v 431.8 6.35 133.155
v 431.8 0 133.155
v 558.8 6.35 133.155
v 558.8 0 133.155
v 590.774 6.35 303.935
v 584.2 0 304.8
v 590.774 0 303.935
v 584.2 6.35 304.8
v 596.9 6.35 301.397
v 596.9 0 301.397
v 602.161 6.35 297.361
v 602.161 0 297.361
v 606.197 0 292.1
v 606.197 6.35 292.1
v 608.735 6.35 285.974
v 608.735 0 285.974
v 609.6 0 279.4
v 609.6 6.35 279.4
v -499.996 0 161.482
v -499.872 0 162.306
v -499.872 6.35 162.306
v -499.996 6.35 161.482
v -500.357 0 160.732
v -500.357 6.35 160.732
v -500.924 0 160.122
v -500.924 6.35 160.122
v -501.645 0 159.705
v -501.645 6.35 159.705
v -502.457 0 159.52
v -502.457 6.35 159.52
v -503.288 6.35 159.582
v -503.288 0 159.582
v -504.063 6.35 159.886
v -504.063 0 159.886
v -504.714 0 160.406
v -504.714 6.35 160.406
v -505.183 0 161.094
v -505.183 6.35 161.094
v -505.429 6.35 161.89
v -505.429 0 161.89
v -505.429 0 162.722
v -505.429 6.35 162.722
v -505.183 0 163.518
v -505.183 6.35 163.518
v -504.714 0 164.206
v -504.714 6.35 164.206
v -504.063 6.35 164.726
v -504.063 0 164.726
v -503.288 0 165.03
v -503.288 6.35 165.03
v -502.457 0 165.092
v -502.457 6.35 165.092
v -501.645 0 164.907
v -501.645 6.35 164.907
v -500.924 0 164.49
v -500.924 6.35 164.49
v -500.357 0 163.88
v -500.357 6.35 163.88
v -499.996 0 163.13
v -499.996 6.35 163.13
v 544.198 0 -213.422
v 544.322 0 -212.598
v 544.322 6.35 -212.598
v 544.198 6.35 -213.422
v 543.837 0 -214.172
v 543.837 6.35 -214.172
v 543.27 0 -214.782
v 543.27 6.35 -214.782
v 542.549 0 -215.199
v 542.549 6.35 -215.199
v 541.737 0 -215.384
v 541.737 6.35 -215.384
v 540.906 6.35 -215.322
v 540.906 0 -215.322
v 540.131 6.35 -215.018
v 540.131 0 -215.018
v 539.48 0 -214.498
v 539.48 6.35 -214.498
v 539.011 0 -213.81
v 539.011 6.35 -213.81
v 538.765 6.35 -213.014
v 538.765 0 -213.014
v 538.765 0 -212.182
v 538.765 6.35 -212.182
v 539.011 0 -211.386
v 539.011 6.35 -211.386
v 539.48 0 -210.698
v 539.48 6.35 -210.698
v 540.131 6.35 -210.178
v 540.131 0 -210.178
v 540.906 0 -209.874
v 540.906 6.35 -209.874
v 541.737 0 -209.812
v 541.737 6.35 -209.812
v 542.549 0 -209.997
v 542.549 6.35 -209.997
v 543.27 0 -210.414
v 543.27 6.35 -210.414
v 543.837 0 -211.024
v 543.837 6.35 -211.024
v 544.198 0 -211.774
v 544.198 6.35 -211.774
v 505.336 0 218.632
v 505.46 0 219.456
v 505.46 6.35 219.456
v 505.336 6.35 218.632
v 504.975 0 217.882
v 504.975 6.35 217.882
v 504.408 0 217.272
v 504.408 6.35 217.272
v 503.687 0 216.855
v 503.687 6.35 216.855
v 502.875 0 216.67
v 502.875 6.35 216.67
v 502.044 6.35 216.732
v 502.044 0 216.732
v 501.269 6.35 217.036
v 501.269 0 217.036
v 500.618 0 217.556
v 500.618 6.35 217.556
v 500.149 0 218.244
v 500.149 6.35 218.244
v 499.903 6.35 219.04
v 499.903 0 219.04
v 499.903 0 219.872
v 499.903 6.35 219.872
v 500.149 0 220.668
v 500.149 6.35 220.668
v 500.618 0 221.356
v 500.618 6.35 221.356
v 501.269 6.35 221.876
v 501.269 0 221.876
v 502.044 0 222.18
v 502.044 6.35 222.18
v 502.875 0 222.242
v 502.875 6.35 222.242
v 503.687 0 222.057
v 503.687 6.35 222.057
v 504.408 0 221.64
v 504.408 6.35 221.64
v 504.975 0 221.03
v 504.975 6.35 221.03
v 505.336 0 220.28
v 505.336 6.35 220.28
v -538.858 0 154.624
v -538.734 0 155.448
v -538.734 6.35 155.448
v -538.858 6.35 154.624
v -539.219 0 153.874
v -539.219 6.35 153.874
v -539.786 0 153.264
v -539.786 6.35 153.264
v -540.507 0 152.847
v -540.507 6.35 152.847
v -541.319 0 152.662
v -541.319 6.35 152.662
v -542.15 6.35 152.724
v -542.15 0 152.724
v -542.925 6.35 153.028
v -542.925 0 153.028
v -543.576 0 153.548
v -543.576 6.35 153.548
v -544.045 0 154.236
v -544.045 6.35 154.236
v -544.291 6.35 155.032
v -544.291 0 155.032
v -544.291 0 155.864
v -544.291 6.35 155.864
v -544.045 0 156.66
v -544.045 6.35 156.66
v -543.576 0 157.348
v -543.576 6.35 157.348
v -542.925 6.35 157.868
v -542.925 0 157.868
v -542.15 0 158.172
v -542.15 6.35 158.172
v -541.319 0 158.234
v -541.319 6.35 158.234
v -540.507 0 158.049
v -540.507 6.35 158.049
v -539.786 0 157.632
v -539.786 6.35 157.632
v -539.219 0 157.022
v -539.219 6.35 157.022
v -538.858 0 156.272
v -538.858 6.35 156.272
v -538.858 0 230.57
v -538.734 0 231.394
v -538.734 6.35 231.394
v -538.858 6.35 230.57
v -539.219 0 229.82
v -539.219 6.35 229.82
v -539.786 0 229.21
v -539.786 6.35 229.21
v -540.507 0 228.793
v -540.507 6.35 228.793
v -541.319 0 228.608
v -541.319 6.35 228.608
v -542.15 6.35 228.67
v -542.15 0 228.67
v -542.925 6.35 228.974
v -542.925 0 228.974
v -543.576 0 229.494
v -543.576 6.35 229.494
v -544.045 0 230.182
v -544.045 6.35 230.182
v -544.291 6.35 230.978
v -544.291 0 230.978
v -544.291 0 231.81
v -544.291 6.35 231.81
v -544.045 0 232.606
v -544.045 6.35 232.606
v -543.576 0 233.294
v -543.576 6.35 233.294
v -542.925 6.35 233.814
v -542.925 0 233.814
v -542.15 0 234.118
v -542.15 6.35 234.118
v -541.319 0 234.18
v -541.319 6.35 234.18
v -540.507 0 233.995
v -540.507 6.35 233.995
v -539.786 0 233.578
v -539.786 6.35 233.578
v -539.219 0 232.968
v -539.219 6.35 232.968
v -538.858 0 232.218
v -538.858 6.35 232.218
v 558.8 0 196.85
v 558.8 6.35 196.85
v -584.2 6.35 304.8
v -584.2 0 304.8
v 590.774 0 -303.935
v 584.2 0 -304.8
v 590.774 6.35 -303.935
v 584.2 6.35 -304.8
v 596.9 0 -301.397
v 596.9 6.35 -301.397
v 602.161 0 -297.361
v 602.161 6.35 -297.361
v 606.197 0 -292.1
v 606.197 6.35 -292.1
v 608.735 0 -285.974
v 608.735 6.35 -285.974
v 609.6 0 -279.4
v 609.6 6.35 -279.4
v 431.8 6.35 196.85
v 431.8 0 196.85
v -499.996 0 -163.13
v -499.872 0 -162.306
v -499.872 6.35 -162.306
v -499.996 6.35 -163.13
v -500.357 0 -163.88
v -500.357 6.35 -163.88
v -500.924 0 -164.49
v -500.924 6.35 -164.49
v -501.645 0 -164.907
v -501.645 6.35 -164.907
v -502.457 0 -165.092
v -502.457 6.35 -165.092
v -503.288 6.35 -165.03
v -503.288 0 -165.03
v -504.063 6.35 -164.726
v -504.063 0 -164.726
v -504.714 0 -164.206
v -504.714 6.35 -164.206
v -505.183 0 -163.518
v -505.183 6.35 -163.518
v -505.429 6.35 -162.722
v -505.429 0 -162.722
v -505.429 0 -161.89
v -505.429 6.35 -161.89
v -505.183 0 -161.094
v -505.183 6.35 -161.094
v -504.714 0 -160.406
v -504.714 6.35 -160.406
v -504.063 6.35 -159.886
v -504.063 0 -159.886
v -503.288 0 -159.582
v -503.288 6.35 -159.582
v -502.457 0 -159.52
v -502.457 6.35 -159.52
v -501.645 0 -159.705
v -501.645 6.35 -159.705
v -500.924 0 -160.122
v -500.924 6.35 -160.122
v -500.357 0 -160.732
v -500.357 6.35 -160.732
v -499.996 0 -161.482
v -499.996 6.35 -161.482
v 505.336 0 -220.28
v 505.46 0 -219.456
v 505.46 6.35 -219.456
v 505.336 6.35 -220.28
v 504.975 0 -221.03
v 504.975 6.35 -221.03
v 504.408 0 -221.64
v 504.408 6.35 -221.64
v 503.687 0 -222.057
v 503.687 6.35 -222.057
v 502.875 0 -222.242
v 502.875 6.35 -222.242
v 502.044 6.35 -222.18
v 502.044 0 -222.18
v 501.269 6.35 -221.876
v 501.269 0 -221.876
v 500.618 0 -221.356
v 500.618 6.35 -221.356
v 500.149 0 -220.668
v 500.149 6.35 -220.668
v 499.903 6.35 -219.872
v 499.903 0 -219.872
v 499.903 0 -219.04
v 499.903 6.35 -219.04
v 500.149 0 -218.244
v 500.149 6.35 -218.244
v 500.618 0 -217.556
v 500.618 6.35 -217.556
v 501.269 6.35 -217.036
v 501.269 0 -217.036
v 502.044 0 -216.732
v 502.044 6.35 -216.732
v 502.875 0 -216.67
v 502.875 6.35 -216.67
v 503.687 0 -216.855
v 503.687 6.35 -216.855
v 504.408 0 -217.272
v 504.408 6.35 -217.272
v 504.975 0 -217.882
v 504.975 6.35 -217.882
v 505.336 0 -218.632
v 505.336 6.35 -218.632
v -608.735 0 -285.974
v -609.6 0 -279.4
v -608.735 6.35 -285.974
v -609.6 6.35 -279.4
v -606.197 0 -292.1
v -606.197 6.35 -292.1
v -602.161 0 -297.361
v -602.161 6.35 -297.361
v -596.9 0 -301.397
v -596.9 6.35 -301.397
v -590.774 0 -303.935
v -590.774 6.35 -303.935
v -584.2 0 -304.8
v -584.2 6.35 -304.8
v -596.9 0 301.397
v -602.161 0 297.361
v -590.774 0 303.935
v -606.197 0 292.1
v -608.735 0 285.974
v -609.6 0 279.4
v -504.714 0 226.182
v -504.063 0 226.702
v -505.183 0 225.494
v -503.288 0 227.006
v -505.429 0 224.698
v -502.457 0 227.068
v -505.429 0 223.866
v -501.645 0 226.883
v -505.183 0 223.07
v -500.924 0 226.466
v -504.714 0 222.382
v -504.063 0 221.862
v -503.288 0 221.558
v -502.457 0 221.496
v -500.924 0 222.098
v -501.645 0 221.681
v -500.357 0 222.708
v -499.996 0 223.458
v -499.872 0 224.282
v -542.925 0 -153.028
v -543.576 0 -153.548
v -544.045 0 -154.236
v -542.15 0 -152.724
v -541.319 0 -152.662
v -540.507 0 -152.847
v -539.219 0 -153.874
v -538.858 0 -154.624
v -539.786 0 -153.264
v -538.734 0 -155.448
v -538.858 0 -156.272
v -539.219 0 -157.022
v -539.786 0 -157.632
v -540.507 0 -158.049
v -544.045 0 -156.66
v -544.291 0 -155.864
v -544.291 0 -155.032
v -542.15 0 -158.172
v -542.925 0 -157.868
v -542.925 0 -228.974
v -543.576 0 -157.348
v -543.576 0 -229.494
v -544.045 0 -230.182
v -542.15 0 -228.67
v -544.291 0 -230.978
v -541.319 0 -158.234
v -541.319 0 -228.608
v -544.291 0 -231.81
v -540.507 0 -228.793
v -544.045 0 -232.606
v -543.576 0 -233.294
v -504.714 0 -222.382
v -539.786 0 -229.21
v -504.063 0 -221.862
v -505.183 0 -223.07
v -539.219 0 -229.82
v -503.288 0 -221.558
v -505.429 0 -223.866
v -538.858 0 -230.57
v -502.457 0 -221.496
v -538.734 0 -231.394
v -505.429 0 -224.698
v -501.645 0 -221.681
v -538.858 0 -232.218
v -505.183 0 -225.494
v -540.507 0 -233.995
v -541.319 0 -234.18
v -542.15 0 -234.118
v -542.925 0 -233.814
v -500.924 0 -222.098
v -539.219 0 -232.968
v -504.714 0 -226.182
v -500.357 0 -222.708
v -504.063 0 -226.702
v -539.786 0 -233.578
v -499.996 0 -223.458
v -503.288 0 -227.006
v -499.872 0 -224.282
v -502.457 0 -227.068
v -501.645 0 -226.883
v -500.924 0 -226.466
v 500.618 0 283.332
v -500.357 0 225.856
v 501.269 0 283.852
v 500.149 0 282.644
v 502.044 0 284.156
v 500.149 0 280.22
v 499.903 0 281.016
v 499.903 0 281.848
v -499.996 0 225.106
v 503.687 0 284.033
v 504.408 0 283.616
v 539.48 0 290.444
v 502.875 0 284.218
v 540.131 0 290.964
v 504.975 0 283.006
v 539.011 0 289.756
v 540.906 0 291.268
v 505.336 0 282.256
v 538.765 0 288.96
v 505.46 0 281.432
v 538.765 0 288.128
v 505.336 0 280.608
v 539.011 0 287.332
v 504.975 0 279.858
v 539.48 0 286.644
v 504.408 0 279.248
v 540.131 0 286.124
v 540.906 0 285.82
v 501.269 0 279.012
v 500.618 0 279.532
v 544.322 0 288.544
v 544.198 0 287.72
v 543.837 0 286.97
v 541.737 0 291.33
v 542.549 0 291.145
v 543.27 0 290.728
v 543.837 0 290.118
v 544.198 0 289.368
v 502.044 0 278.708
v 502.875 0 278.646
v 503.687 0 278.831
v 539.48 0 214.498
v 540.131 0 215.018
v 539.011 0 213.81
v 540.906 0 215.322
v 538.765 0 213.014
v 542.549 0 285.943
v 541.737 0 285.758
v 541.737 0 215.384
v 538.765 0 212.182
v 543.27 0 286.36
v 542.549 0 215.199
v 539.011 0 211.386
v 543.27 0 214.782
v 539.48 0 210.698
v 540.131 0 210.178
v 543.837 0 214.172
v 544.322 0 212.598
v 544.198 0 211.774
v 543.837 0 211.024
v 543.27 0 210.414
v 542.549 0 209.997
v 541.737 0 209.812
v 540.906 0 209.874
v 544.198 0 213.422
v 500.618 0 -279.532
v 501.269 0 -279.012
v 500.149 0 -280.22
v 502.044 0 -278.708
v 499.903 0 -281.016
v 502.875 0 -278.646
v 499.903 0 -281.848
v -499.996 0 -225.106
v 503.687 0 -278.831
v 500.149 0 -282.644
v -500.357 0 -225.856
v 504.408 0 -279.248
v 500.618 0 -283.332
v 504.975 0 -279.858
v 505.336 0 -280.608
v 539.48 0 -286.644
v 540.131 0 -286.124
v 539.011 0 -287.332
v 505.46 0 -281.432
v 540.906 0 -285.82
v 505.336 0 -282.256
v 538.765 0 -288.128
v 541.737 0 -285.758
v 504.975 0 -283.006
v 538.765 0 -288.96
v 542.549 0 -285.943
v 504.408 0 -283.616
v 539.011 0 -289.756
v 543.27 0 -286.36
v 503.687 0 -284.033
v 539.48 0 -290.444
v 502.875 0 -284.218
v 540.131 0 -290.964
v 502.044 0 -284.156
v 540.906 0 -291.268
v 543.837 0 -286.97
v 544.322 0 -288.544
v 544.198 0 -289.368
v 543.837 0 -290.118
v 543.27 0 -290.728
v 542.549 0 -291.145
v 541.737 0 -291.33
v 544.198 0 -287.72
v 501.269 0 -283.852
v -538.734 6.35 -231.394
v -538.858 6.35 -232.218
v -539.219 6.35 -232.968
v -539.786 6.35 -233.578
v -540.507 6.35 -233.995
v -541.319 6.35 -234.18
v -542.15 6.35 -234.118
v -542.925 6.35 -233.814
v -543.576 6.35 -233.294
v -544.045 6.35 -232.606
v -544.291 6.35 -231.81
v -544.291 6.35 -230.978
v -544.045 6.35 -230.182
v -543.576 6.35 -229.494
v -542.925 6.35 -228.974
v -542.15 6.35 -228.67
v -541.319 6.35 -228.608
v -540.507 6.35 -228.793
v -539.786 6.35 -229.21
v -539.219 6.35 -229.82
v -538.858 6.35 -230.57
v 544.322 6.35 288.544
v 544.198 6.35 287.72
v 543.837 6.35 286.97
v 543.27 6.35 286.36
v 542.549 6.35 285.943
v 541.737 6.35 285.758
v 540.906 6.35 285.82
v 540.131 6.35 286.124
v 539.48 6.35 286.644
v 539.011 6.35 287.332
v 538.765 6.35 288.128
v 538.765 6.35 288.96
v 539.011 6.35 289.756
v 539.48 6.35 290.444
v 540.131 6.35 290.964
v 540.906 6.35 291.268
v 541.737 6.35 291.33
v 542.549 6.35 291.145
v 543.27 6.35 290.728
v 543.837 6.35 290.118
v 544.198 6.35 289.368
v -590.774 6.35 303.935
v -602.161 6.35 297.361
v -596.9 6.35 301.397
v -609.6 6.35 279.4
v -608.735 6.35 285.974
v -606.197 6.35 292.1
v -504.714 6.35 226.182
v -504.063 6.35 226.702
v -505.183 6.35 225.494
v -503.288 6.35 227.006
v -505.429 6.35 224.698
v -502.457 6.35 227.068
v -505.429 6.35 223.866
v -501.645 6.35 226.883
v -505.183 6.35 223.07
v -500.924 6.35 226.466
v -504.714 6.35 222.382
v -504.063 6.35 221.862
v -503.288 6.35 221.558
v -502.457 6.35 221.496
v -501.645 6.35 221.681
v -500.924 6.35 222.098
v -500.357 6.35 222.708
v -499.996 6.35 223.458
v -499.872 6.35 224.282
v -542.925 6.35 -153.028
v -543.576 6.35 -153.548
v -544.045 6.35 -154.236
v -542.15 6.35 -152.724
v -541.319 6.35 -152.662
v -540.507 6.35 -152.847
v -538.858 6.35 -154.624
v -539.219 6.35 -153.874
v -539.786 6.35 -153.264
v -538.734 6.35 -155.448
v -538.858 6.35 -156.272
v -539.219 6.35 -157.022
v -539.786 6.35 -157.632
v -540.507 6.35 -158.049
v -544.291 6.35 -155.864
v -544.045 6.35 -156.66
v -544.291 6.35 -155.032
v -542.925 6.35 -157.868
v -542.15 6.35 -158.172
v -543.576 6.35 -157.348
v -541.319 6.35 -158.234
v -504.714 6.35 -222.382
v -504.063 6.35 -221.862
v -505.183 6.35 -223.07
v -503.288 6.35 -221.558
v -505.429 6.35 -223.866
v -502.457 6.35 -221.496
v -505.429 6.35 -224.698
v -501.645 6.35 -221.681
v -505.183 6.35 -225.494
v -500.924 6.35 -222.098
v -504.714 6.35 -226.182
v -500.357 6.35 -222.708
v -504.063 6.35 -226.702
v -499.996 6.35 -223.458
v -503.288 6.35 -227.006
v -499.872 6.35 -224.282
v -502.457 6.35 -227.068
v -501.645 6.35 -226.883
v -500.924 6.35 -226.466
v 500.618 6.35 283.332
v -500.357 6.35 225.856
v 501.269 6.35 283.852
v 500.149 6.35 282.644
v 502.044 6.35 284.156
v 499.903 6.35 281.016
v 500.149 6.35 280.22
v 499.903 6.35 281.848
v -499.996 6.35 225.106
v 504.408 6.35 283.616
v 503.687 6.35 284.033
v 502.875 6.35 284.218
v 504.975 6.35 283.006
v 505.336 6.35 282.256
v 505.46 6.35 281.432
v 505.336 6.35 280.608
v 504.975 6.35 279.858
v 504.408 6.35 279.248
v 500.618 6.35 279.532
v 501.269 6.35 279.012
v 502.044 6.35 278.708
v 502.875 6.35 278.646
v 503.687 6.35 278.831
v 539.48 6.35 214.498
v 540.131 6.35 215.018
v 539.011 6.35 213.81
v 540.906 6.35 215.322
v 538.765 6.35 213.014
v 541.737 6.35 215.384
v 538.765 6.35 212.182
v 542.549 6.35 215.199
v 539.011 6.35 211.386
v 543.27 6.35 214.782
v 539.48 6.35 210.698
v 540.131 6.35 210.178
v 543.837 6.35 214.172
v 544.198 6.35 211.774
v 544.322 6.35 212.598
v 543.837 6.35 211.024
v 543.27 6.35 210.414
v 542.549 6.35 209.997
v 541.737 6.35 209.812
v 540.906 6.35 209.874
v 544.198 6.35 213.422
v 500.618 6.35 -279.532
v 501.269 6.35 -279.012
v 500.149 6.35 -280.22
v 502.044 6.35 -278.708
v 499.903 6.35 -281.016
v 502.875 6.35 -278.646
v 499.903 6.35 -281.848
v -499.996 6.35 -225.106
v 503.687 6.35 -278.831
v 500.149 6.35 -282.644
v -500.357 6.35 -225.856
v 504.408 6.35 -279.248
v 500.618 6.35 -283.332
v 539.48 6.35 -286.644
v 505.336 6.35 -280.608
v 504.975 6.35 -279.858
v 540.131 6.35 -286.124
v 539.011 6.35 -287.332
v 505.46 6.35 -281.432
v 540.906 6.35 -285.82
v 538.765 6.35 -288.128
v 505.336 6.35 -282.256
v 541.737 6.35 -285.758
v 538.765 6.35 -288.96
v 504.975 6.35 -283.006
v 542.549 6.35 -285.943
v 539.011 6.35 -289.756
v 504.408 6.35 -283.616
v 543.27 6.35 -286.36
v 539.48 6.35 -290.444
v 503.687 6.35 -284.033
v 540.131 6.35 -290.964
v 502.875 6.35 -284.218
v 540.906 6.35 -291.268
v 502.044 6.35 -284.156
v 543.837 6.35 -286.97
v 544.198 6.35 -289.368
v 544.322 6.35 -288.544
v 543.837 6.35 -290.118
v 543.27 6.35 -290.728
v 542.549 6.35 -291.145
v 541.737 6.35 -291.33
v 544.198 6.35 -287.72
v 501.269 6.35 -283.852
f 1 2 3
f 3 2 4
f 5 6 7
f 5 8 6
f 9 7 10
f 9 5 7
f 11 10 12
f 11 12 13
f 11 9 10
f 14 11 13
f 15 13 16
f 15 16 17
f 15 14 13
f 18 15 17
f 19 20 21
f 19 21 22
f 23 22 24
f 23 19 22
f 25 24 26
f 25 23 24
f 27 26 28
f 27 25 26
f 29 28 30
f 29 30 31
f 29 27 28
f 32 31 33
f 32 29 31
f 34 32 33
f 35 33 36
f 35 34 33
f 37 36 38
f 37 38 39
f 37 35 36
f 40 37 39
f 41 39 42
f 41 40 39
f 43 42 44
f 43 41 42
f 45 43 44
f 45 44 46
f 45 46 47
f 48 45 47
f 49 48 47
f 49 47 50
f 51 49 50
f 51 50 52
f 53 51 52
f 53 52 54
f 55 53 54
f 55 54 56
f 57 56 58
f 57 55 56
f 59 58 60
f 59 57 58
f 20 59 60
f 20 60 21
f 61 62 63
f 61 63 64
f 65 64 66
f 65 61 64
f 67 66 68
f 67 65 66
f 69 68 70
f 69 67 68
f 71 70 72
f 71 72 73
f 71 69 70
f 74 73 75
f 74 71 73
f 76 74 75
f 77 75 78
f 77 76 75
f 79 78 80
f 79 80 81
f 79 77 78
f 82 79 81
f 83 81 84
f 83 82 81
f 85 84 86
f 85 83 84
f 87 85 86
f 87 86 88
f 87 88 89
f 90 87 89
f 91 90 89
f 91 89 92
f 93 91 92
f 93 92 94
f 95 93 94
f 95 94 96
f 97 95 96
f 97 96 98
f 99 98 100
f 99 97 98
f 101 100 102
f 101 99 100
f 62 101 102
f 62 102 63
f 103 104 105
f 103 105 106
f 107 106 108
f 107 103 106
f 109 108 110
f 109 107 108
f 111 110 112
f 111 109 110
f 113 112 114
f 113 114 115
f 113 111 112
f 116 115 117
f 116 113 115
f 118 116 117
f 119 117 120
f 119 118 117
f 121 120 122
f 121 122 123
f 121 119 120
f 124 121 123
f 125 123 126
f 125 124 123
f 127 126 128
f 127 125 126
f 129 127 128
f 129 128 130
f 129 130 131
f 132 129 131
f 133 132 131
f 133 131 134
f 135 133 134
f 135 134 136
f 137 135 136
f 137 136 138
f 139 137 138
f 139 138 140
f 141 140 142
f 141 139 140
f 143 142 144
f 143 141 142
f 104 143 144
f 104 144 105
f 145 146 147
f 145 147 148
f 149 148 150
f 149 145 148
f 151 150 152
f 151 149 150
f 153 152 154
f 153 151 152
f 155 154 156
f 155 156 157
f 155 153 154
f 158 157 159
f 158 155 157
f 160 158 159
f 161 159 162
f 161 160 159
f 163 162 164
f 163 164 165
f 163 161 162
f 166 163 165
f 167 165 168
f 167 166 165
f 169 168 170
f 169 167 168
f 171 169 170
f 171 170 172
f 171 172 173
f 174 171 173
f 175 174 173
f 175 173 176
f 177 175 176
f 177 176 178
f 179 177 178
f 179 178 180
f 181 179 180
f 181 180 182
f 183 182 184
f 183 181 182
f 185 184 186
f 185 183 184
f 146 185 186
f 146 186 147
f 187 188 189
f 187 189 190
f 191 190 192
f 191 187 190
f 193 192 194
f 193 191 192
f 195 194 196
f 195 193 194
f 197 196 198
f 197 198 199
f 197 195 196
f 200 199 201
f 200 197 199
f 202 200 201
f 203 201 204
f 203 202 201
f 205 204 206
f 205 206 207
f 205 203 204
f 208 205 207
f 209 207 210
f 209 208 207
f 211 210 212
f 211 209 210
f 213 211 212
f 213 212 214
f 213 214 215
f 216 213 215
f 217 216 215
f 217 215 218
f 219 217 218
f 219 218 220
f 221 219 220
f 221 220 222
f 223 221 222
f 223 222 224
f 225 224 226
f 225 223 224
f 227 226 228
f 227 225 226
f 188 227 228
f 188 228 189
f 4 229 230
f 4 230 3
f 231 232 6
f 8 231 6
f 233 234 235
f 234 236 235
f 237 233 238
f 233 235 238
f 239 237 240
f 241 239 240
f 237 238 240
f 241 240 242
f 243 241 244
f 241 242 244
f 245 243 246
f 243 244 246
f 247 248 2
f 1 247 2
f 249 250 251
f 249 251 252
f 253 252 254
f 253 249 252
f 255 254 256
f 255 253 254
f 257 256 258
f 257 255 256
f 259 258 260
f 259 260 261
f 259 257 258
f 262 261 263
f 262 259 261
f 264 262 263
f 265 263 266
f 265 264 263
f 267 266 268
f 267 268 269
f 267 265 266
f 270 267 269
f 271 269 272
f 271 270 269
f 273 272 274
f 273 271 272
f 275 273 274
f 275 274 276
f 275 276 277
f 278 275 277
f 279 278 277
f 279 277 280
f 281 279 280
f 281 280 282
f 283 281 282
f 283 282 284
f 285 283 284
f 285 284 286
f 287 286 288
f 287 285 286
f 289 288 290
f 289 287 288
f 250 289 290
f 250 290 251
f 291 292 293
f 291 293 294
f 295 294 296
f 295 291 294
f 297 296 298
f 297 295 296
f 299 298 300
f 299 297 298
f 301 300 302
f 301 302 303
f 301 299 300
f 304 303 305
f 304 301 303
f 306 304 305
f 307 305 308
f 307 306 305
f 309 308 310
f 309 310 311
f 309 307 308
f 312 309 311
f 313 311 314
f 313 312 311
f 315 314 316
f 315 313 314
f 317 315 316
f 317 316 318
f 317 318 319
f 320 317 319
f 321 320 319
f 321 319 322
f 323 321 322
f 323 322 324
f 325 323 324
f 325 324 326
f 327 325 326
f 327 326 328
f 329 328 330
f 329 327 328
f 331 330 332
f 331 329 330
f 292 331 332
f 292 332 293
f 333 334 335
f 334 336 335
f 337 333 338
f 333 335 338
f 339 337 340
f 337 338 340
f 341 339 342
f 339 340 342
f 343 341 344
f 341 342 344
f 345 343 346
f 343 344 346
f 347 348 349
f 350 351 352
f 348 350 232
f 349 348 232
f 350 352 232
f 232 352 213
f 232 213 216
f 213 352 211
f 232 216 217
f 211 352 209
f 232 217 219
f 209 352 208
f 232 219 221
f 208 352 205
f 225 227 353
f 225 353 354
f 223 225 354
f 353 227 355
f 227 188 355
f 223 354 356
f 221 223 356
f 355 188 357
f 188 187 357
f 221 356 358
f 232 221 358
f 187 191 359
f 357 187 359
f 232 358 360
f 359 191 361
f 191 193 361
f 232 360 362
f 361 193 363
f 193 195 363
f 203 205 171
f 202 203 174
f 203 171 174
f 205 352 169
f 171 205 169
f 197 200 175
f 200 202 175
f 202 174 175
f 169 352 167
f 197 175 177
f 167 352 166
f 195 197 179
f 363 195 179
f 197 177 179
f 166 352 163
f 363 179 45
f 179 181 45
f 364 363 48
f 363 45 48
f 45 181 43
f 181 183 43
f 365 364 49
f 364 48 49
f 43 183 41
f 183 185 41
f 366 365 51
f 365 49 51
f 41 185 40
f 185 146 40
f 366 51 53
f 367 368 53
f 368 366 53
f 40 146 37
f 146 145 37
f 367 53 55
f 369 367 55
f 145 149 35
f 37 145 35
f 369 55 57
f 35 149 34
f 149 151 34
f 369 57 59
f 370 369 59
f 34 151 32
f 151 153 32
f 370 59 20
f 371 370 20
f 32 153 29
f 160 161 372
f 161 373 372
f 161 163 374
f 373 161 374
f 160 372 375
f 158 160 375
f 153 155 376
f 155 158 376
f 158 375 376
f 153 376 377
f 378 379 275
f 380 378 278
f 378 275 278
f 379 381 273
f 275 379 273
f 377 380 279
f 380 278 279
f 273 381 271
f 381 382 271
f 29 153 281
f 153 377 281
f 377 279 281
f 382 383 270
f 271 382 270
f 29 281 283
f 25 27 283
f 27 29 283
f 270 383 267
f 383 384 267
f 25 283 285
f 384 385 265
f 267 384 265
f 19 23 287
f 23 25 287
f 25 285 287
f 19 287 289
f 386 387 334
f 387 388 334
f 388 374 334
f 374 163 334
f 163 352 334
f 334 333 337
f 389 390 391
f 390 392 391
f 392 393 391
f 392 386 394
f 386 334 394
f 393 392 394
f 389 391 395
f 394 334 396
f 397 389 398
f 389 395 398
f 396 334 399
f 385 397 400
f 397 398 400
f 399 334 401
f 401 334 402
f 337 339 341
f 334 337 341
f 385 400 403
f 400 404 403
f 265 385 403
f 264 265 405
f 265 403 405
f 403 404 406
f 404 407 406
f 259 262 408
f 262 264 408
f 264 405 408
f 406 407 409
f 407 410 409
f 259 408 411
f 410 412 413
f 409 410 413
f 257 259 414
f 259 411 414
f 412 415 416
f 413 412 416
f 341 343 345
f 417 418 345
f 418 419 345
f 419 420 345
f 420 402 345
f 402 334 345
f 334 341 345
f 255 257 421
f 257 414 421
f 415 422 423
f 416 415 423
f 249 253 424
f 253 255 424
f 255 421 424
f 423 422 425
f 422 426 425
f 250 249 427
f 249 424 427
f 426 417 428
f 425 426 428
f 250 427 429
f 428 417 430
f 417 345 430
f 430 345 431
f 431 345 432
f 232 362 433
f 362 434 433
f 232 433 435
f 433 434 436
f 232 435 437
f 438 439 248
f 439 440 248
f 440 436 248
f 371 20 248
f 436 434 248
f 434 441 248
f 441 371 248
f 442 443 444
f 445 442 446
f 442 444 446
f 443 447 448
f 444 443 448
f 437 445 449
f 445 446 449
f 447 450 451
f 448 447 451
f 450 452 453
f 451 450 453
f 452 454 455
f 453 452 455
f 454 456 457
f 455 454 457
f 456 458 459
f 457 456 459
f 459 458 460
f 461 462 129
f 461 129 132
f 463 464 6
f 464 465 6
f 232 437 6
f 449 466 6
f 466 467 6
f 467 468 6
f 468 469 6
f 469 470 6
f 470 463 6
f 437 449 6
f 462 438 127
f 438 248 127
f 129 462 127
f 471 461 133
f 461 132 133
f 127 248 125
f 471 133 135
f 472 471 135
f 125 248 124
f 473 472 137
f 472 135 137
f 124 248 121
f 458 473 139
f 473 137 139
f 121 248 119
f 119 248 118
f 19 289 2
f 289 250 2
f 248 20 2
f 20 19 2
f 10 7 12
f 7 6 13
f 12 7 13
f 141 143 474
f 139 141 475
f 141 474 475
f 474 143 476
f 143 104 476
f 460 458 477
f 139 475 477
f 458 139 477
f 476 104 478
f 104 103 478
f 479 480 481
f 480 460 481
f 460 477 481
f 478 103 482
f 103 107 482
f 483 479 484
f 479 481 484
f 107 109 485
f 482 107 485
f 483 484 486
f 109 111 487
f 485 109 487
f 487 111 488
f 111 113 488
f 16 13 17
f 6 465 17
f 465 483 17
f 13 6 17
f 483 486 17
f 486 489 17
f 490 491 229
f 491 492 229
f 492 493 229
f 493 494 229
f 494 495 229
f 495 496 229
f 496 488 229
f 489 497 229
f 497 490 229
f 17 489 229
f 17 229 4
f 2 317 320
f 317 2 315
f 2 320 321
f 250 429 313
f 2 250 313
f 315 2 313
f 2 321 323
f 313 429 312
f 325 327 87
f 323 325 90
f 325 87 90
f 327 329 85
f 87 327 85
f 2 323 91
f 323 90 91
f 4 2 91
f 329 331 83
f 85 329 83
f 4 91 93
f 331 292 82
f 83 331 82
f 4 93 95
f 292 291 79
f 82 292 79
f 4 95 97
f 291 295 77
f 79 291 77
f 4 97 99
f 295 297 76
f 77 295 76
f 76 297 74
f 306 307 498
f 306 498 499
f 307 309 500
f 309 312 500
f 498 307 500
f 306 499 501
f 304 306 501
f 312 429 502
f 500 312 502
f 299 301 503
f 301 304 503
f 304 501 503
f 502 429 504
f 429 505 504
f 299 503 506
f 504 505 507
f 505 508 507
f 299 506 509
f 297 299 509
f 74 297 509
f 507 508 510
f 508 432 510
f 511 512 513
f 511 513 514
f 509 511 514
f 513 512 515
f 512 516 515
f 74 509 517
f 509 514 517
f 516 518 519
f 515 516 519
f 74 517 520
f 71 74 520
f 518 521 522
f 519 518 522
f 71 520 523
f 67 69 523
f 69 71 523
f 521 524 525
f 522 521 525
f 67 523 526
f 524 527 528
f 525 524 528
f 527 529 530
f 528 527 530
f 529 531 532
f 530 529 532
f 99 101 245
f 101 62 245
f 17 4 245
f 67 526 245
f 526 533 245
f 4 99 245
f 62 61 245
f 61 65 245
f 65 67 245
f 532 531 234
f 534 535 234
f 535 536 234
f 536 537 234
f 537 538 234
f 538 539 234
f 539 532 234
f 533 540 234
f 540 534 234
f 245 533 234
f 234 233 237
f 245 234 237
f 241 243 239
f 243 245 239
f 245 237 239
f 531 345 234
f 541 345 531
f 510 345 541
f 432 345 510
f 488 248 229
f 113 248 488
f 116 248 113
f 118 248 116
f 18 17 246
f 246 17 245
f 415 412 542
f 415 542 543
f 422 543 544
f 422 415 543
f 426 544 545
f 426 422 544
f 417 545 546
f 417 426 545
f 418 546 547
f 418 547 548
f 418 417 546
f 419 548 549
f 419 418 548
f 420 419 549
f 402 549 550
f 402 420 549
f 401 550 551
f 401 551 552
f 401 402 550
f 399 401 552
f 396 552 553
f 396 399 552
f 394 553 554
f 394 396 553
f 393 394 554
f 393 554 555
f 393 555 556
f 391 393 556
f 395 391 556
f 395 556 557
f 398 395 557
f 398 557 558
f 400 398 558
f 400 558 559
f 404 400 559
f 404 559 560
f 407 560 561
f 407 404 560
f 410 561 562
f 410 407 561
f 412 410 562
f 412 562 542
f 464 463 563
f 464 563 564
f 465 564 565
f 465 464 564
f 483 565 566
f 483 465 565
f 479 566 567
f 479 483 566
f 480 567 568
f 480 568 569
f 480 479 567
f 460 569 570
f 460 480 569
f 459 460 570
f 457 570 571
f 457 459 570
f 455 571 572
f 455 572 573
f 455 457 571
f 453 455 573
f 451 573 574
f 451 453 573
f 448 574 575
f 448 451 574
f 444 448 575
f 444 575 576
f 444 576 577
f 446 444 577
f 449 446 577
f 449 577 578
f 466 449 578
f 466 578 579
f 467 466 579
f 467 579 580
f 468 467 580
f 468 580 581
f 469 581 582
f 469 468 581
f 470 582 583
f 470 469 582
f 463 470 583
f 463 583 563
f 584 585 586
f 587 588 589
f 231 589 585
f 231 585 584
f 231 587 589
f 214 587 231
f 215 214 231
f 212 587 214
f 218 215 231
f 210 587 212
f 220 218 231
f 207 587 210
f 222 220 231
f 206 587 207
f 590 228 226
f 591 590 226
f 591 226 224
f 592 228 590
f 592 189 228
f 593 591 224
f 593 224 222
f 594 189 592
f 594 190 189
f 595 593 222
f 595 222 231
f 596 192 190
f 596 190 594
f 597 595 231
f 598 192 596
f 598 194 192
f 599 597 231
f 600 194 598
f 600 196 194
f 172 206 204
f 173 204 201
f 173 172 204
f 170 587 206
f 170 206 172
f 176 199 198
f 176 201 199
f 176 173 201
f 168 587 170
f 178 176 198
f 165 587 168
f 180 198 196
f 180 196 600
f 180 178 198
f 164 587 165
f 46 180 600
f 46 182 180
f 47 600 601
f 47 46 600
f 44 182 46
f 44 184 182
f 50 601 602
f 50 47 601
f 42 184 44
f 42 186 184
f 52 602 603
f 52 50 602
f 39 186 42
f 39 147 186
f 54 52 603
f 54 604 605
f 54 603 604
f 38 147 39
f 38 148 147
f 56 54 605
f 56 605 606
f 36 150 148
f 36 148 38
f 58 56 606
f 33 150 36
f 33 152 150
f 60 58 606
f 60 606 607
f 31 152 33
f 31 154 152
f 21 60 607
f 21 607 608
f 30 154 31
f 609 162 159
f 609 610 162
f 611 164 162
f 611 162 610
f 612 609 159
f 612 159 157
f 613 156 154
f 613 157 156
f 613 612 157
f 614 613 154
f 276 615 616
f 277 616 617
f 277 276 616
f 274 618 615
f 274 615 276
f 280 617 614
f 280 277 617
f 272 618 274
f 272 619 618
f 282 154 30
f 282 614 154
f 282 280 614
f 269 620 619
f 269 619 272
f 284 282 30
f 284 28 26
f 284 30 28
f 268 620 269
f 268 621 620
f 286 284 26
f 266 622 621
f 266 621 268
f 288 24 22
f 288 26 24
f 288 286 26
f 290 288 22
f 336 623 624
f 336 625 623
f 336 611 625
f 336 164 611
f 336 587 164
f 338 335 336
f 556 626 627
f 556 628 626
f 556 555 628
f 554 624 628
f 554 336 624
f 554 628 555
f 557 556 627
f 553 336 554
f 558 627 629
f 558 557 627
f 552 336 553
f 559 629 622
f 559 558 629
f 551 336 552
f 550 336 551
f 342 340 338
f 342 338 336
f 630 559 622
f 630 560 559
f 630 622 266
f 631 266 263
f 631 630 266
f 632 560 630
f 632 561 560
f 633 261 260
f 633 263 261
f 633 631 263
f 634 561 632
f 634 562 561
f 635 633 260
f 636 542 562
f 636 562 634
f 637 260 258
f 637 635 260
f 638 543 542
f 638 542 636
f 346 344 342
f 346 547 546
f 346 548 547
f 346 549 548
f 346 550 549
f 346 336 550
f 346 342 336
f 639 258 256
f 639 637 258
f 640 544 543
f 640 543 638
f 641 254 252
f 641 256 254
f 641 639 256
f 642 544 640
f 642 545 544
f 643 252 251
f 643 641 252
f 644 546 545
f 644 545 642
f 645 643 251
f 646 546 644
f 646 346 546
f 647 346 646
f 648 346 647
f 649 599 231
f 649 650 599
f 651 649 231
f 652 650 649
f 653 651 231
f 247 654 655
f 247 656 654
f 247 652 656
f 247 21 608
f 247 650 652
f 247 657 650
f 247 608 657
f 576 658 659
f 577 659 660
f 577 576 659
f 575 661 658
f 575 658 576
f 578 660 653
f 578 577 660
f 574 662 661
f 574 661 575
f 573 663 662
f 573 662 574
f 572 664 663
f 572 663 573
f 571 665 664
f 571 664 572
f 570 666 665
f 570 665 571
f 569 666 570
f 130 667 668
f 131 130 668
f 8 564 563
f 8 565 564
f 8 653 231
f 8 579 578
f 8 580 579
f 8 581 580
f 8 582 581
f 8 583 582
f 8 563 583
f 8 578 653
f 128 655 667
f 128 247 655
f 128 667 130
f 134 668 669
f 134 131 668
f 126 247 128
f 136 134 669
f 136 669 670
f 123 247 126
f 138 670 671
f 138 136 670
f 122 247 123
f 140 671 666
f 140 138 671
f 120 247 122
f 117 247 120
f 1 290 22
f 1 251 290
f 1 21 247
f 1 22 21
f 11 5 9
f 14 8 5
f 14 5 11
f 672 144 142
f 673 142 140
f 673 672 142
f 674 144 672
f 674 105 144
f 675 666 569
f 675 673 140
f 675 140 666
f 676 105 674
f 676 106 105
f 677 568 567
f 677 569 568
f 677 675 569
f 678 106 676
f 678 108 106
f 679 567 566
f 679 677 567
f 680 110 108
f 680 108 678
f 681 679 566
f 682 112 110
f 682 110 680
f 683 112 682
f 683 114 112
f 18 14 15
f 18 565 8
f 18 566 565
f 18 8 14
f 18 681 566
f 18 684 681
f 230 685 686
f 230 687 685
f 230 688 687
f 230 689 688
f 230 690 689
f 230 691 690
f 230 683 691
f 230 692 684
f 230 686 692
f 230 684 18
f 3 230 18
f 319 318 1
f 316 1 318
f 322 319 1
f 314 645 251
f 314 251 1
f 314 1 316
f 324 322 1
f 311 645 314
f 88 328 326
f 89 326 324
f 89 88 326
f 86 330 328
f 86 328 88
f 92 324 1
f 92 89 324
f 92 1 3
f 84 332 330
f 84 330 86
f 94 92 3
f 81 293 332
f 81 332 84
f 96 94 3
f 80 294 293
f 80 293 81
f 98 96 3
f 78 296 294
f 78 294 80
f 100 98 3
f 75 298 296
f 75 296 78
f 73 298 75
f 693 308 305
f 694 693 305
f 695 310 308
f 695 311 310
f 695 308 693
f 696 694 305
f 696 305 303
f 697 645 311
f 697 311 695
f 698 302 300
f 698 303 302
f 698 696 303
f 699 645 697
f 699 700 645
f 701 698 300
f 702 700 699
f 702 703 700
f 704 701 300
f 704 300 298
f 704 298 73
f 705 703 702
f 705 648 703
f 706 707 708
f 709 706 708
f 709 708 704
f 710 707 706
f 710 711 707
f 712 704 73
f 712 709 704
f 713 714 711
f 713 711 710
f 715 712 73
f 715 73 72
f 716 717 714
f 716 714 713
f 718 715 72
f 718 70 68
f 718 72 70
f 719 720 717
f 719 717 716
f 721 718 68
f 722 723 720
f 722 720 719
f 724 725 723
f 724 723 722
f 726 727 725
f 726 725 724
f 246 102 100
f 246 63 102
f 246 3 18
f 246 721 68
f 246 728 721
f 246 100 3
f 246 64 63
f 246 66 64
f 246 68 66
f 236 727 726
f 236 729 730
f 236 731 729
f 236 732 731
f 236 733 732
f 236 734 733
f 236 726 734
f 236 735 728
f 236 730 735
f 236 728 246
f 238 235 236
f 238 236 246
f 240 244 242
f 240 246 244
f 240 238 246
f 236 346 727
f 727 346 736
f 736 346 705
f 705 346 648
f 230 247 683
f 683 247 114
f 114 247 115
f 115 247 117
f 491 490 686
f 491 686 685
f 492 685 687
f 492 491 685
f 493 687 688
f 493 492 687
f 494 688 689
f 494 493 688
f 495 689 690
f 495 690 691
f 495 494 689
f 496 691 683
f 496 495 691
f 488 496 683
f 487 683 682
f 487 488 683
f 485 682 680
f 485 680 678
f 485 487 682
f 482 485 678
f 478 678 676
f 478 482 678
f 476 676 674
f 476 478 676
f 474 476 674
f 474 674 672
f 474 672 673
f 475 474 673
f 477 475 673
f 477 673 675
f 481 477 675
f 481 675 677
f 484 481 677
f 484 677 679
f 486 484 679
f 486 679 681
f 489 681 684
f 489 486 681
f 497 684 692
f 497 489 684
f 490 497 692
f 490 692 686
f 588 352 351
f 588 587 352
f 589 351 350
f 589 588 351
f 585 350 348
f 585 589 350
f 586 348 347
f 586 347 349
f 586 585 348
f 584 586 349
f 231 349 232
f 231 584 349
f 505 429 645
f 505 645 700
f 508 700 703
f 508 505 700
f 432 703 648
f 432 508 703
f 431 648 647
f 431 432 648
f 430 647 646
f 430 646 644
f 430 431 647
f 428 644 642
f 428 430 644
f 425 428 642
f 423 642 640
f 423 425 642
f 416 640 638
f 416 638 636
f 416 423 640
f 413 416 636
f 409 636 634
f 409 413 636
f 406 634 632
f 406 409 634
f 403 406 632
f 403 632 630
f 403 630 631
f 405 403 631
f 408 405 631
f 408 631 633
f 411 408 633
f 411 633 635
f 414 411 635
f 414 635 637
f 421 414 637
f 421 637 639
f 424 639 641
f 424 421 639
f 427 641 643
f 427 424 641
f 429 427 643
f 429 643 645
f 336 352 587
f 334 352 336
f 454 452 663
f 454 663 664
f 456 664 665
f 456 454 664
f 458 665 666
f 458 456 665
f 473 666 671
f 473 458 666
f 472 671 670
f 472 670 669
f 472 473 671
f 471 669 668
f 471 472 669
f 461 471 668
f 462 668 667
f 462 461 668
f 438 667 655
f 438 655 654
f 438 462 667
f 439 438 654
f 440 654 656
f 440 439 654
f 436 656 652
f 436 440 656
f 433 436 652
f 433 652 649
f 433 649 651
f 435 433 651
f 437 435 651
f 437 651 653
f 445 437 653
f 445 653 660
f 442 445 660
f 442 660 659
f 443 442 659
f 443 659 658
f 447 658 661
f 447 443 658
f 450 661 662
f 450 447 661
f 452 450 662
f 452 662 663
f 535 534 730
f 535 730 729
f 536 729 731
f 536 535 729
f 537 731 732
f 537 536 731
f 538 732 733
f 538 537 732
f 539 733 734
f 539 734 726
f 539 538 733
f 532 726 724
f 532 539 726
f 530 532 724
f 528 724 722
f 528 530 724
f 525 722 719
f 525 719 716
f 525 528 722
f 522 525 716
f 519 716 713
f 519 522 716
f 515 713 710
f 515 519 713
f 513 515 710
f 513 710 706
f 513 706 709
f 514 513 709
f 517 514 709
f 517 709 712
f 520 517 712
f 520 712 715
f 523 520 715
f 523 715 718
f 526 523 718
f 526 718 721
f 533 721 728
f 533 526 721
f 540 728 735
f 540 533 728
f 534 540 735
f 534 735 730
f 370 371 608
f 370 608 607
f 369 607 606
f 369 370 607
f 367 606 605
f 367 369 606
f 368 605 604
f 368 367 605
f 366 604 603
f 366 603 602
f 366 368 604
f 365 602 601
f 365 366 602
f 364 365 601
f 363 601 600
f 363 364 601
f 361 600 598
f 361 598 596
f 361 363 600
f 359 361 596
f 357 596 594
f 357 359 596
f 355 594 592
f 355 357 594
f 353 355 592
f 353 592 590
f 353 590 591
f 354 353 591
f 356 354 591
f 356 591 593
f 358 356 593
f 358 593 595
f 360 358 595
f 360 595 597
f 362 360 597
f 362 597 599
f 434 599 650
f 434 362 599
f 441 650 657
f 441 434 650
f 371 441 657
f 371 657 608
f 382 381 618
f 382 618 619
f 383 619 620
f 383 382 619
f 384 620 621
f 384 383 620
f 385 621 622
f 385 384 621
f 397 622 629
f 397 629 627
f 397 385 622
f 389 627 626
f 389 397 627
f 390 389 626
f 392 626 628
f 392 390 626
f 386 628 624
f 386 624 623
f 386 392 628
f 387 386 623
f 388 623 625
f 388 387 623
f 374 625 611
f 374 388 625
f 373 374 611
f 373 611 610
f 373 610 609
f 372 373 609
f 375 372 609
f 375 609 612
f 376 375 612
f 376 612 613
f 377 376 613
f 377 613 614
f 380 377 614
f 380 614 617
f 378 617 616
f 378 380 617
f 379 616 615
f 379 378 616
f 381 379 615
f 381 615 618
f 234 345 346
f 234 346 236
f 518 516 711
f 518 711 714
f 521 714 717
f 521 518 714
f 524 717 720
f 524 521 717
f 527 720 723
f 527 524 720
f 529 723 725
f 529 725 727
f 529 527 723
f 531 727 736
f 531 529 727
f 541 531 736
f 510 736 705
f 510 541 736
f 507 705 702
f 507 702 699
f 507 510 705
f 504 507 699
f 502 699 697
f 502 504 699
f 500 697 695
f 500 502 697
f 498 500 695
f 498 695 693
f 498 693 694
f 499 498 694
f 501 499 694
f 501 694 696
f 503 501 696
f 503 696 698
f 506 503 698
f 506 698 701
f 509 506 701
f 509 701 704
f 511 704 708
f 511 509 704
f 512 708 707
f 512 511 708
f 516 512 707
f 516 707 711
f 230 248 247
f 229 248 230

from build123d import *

# Parameters (mm, degrees)
SKETCH2_W           = 1219.2
SKETCH2_H           = 609.6
SKETCH2_R           = 2.794
SKETCH2_W_2         = 127
SKETCH2_H_2         = 63.694904898
BOSS_EXTRUDE1_DEPTH = 6.35
FILLET1_R           = 25.4


with BuildPart() as part:
    # Sketch2 → Boss-Extrude1 (new body)
    with BuildSketch(Plane(origin=(0, 0, 0), x_dir=(1, 0, 0), z_dir=(0, 1, 0))):
        Rectangle(SKETCH2_W, SKETCH2_H)
        with Locations((541.528, 288.544)):
            Circle(SKETCH2_R, mode=Mode.SUBTRACT)
        with Locations((541.528, 212.598)):
            Circle(SKETCH2_R, mode=Mode.SUBTRACT)
        with Locations((502.666, 219.456)):
            Circle(SKETCH2_R, mode=Mode.SUBTRACT)
        with Locations((502.666, 281.432)):
            Circle(SKETCH2_R, mode=Mode.SUBTRACT)
        with Locations((502.666, -281.432)):
            Circle(SKETCH2_R, mode=Mode.SUBTRACT)
        with Locations((502.666, -219.456)):
            Circle(SKETCH2_R, mode=Mode.SUBTRACT)
        with Locations((541.528, -212.598)):
            Circle(SKETCH2_R, mode=Mode.SUBTRACT)
        with Locations((541.528, -288.544)):
            Circle(SKETCH2_R, mode=Mode.SUBTRACT)
        with Locations((-541.528, 155.448)):
            Circle(SKETCH2_R, mode=Mode.SUBTRACT)
        with Locations((-502.666, 224.282)):
            Circle(SKETCH2_R, mode=Mode.SUBTRACT)
        with Locations((-541.528, 231.394)):
            Circle(SKETCH2_R, mode=Mode.SUBTRACT)
        with Locations((-502.666, 162.306)):
            Circle(SKETCH2_R, mode=Mode.SUBTRACT)
        with Locations((-502.666, -162.306)):
            Circle(SKETCH2_R, mode=Mode.SUBTRACT)
        with Locations((-541.528, -231.394)):
            Circle(SKETCH2_R, mode=Mode.SUBTRACT)
        with Locations((-502.666, -224.282)):
            Circle(SKETCH2_R, mode=Mode.SUBTRACT)
        with Locations((-541.528, -155.448)):
            Circle(SKETCH2_R, mode=Mode.SUBTRACT)
        with Locations((495.3, -165.002547551)):
            Rectangle(SKETCH2_W_2, SKETCH2_H_2, mode=Mode.SUBTRACT)
    extrude(amount=BOSS_EXTRUDE1_DEPTH)

    # Fillet1
    fillet1_edges = [part.edges().sort_by_distance(p)[0] for p in [
        (609.6, 3.175, 304.8),
        (-609.6, 3.175, 304.8),
        (-609.6, 3.175, -304.8),
        (609.6, 3.175, -304.8),
    ]]
    fillet(fillet1_edges, radius=FILLET1_R)


solid = part.part
